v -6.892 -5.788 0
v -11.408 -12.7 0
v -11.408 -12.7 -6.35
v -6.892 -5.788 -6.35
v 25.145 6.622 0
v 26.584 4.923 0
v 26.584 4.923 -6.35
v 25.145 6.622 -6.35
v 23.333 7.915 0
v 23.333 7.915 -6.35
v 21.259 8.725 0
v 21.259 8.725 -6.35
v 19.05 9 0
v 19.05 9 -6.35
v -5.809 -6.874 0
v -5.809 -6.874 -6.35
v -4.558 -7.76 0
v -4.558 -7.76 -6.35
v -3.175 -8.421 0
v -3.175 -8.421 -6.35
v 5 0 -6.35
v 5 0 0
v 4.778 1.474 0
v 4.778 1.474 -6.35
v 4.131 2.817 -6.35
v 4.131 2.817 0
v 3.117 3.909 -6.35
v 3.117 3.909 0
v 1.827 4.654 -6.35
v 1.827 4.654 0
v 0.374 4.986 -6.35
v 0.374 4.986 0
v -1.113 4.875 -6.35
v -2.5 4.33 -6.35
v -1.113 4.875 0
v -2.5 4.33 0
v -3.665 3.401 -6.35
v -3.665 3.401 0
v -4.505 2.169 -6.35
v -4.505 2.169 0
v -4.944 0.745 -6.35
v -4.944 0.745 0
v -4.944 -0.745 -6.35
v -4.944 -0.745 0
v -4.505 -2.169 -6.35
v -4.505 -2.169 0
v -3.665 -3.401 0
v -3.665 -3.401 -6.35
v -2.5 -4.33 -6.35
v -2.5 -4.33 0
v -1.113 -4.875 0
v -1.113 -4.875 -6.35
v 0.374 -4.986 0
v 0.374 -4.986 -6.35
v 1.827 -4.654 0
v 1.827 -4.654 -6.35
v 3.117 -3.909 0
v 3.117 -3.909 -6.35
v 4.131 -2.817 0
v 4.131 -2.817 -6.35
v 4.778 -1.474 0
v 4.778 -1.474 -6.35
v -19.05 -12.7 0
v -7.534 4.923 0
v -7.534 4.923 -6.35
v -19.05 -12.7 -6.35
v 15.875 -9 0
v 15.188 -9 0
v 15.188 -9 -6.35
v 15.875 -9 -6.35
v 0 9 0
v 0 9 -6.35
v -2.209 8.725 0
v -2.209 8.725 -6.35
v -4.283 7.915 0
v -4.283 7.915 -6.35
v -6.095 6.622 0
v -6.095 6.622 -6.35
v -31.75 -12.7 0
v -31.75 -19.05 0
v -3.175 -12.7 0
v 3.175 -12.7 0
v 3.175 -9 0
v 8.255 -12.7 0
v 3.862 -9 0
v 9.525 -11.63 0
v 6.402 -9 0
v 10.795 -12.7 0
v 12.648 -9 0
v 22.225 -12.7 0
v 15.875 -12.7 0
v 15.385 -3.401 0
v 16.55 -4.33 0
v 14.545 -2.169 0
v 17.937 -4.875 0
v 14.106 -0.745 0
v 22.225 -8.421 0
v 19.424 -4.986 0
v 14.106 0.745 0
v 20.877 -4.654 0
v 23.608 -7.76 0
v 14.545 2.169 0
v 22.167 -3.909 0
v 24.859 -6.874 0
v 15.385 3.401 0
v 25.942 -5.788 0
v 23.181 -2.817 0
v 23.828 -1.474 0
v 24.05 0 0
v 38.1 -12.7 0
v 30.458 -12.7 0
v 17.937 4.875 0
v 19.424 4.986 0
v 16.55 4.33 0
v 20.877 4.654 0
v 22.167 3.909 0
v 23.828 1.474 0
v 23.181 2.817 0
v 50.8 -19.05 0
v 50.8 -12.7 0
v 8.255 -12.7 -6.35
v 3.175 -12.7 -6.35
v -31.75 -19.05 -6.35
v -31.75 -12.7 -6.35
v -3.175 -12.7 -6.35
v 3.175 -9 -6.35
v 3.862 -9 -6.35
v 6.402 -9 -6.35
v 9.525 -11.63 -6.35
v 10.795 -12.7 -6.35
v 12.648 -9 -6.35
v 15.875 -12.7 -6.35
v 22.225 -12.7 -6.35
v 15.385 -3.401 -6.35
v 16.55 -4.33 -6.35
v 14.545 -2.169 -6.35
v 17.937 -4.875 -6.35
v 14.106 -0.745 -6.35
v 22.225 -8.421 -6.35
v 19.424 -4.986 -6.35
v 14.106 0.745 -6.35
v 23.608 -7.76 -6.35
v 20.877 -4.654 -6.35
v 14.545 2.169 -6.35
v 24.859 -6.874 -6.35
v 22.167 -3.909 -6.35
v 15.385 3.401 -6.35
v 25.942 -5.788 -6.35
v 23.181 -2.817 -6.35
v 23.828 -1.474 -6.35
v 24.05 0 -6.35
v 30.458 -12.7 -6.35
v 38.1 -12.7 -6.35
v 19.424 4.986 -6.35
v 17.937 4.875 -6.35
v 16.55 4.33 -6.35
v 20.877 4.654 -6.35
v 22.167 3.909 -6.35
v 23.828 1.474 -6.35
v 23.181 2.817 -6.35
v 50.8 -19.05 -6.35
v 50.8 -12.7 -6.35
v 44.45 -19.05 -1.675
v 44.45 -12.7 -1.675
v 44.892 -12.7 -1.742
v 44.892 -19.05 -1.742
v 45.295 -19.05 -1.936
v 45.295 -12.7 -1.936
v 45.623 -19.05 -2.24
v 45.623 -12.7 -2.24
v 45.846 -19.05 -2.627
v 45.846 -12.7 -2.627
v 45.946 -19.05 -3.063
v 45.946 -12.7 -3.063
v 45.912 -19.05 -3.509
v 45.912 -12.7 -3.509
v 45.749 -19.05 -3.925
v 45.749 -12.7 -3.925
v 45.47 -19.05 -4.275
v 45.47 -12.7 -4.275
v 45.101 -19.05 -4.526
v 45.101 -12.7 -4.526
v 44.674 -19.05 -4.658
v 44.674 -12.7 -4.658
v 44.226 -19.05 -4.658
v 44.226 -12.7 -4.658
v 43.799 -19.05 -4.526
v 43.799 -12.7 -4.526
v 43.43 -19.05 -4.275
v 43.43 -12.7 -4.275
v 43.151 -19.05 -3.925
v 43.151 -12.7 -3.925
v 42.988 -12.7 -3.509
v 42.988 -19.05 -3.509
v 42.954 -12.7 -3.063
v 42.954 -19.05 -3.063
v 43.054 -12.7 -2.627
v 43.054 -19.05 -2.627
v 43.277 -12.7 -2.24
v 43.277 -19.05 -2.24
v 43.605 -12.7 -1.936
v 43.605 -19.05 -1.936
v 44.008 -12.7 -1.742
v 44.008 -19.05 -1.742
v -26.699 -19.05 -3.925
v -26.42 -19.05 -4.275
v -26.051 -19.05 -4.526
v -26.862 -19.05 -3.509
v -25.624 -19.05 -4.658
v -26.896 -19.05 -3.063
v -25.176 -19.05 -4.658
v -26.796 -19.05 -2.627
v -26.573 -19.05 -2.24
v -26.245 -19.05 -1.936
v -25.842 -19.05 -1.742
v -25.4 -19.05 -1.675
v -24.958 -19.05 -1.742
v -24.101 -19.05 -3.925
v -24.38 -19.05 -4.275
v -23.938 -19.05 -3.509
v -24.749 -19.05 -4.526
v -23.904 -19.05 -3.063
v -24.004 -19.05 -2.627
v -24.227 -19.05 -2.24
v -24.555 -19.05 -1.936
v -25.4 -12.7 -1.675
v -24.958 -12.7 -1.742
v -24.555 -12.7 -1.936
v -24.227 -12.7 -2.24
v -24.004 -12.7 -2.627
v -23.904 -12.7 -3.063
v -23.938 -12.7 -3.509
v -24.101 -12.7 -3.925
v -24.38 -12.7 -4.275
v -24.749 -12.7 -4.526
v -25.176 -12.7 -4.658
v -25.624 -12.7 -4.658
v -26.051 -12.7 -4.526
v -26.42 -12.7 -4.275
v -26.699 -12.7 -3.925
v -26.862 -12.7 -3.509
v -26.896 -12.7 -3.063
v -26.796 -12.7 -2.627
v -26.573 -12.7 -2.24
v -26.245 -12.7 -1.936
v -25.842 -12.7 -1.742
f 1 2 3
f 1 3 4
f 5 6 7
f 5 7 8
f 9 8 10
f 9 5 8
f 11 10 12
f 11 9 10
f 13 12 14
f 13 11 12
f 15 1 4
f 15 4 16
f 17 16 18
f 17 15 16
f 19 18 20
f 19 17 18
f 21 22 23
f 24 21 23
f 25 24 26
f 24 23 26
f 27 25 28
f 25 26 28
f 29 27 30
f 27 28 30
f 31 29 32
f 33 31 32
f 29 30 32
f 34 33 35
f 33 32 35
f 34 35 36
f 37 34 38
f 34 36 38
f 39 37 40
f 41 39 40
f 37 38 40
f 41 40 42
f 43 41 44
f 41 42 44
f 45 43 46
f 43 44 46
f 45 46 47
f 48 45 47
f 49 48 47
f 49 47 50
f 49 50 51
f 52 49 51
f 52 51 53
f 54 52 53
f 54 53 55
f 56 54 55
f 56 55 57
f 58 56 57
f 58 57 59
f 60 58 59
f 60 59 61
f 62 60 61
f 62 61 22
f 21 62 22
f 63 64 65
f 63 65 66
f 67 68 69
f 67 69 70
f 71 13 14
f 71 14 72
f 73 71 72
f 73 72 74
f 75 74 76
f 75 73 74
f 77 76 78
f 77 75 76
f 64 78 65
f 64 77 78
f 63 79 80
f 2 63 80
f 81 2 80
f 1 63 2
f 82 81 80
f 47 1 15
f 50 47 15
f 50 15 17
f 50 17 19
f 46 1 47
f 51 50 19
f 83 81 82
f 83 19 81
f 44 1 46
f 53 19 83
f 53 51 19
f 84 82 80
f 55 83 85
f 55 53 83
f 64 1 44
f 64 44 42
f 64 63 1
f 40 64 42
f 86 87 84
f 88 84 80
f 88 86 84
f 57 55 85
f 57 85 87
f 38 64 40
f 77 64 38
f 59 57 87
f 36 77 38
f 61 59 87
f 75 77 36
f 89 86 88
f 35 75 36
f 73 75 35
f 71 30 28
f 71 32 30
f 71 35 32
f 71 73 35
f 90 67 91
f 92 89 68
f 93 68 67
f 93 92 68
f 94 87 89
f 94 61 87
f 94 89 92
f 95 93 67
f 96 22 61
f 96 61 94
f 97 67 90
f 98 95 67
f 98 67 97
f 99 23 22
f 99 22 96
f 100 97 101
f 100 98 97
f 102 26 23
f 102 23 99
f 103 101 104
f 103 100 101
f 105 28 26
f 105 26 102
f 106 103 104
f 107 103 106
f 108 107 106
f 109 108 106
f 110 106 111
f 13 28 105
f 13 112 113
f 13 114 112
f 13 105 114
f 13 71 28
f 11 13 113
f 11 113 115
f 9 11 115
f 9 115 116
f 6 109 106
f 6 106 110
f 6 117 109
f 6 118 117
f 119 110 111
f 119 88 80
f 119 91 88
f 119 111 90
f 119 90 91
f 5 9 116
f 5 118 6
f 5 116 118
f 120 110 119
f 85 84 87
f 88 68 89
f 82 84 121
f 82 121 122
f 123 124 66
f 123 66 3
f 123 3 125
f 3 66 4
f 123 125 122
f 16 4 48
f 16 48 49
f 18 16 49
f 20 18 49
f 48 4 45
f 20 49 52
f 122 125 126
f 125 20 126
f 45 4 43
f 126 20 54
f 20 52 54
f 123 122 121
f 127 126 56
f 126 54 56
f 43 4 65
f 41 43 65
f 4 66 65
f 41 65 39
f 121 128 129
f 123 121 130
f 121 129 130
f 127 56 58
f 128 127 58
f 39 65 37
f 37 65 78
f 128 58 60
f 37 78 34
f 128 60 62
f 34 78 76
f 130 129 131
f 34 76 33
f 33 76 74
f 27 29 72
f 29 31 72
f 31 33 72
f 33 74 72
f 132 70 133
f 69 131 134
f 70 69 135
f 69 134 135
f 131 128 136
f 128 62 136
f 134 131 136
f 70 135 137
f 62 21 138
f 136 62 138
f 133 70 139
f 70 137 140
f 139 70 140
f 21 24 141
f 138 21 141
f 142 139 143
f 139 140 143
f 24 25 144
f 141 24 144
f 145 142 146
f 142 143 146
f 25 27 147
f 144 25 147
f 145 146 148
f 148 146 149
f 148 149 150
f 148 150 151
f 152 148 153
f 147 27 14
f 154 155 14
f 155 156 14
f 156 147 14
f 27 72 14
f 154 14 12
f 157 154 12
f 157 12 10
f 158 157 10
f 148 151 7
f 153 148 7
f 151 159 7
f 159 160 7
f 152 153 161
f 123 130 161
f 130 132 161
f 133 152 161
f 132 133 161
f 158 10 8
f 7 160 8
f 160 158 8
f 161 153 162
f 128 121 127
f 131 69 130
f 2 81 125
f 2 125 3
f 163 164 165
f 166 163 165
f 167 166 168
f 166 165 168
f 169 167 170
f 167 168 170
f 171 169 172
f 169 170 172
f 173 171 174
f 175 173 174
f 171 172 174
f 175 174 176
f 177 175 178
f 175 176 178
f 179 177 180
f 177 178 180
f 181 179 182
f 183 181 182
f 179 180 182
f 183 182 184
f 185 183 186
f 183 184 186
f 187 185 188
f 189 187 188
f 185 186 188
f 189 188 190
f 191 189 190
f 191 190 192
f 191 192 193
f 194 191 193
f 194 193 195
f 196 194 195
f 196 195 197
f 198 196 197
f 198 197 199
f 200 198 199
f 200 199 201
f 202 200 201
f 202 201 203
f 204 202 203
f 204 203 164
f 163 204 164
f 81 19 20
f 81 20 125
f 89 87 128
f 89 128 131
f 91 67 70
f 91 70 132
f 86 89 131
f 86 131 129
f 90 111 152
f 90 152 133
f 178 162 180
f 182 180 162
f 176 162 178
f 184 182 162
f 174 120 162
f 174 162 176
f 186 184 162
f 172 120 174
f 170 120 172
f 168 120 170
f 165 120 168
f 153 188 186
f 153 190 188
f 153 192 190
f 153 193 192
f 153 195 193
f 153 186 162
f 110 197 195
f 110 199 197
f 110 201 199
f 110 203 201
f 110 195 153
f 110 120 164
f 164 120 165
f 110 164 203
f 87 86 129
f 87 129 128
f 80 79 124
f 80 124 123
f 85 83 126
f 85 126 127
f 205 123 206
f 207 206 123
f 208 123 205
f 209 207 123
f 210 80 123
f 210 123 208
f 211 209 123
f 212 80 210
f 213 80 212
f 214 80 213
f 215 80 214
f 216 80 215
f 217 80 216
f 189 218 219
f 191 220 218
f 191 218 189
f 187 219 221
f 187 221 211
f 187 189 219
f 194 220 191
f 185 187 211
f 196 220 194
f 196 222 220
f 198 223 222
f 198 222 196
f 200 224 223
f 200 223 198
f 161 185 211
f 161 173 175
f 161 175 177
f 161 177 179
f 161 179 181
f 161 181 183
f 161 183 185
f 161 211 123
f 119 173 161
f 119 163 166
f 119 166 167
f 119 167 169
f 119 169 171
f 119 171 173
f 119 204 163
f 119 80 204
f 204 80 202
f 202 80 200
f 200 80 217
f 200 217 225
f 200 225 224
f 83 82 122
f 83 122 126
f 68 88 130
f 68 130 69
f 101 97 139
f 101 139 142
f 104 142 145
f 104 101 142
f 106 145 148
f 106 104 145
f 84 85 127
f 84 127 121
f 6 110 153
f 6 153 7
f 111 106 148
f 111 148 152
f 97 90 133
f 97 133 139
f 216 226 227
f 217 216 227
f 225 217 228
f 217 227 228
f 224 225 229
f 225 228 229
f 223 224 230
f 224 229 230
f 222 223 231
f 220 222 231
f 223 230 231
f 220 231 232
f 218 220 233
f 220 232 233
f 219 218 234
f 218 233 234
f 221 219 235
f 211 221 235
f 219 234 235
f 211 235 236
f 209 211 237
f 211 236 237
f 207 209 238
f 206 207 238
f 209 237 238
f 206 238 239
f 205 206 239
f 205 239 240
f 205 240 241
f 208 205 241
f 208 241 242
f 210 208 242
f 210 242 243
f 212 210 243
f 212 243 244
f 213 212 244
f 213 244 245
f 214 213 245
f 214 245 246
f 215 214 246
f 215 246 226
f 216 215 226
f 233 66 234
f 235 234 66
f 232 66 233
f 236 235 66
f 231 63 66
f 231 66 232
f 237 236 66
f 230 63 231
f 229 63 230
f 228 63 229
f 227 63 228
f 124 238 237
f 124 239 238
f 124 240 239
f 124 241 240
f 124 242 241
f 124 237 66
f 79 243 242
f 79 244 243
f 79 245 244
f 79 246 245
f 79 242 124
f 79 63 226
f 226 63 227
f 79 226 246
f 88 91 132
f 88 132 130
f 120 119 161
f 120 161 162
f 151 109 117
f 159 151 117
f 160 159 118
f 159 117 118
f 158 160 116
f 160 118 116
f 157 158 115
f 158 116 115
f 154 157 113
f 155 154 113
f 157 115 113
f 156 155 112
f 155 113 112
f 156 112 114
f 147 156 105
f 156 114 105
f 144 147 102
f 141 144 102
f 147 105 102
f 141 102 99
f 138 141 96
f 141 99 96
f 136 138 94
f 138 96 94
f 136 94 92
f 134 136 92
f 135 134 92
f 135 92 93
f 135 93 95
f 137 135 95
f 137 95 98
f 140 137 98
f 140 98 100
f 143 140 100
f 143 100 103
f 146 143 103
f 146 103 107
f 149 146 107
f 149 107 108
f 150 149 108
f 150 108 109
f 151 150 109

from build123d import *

# Parameters (mm, degrees)
BOSS_EXTRUDE1_DEPTH = 6.35
SKETCH2_R           = 5
CUT_EXTRUDE1_DEPTH  = 55.624765446
SKETCH3_R           = 1.5
CUT_EXTRUDE2_DEPTH  = 56.60442878


with BuildPart() as part:
    # Sketch1 → Boss-Extrude1 (new body)
    with BuildSketch(Plane.XY):
        with BuildLine():
            Line((19.05, 9), (0, 9))
            ThreePointArc((0, 9), (-4.283191939, 7.915444827), (-7.534082106, 4.923170403))
            Line((-7.534082106, 4.923170403), (-19.05, -12.7))
            Line((-19.05, -12.7), (-31.75, -12.7))
            Line((-31.75, -12.7), (-31.75, -19.05))
            Line((-31.75, -19.05), (50.8, -19.05))
            Line((50.8, -19.05), (50.8, -12.7))
            Line((50.8, -12.7), (38.1, -12.7))
            Line((38.1, -12.7), (26.584082106, 4.923170403))
            ThreePointArc((26.584082106, 4.923170403), (23.333191939, 7.915444827), (19.05, 9))
        make_face()
        Polygon((3.862011, -9), (8.255, -12.7), (3.175, -12.7), (3.175, -9), align=None, mode=Mode.SUBTRACT)
        Polygon((12.647989, -9), (9.525, -11.63034105), (6.402011, -9), (9.525, -9), align=None, mode=Mode.SUBTRACT)
        with BuildLine():
            Line((30.458149598, -12.7), (22.225, -12.7))
            Line((22.225, -12.7), (22.225, -8.421364201))
            ThreePointArc((22.225, -8.421364201), (24.252671243, -7.343855386), (25.941688674, -5.788318169))
            Line((25.941688674, -5.788318169), (30.458149598, -12.7))
        make_face(mode=Mode.SUBTRACT)
        Polygon((15.875, -12.7), (10.795, -12.7), (15.187989, -9), (15.875, -9), align=None, mode=Mode.SUBTRACT)
        with BuildLine():
            ThreePointArc((-6.891688674, -5.788318169), (-5.202671243, -7.343855386), (-3.175, -8.421364201))
            Line((-3.175, -8.421364201), (-3.175, -12.7))
            Line((-3.175, -12.7), (-11.408149598, -12.7))
            Line((-11.408149598, -12.7), (-6.891688674, -5.788318169))
        make_face(mode=Mode.SUBTRACT)
    extrude(amount=-BOSS_EXTRUDE1_DEPTH)

    # Sketch2 → Cut-Extrude1 (cut, through all)
    with BuildSketch(Plane.XY):
        Circle(SKETCH2_R)
        with Locations((19.05, 0)):
            Circle(SKETCH2_R)
    extrude(amount=-CUT_EXTRUDE1_DEPTH, mode=Mode.SUBTRACT)

    # Sketch3 → Cut-Extrude2 (cut, through all)
    with BuildSketch(Plane(origin=(0, -12.7, 0), x_dir=(1, 0, 0), z_dir=(0, 1, 0))):
        with Locations(Location((44.45, 3.175, 0), (0, 0, 270))):
            Circle(SKETCH3_R)
        with Locations(Location((-25.4, 3.175, 0), (0, 0, 270))):
            Circle(SKETCH3_R)
    extrude(amount=-CUT_EXTRUDE2_DEPTH, mode=Mode.SUBTRACT)


solid = part.part
